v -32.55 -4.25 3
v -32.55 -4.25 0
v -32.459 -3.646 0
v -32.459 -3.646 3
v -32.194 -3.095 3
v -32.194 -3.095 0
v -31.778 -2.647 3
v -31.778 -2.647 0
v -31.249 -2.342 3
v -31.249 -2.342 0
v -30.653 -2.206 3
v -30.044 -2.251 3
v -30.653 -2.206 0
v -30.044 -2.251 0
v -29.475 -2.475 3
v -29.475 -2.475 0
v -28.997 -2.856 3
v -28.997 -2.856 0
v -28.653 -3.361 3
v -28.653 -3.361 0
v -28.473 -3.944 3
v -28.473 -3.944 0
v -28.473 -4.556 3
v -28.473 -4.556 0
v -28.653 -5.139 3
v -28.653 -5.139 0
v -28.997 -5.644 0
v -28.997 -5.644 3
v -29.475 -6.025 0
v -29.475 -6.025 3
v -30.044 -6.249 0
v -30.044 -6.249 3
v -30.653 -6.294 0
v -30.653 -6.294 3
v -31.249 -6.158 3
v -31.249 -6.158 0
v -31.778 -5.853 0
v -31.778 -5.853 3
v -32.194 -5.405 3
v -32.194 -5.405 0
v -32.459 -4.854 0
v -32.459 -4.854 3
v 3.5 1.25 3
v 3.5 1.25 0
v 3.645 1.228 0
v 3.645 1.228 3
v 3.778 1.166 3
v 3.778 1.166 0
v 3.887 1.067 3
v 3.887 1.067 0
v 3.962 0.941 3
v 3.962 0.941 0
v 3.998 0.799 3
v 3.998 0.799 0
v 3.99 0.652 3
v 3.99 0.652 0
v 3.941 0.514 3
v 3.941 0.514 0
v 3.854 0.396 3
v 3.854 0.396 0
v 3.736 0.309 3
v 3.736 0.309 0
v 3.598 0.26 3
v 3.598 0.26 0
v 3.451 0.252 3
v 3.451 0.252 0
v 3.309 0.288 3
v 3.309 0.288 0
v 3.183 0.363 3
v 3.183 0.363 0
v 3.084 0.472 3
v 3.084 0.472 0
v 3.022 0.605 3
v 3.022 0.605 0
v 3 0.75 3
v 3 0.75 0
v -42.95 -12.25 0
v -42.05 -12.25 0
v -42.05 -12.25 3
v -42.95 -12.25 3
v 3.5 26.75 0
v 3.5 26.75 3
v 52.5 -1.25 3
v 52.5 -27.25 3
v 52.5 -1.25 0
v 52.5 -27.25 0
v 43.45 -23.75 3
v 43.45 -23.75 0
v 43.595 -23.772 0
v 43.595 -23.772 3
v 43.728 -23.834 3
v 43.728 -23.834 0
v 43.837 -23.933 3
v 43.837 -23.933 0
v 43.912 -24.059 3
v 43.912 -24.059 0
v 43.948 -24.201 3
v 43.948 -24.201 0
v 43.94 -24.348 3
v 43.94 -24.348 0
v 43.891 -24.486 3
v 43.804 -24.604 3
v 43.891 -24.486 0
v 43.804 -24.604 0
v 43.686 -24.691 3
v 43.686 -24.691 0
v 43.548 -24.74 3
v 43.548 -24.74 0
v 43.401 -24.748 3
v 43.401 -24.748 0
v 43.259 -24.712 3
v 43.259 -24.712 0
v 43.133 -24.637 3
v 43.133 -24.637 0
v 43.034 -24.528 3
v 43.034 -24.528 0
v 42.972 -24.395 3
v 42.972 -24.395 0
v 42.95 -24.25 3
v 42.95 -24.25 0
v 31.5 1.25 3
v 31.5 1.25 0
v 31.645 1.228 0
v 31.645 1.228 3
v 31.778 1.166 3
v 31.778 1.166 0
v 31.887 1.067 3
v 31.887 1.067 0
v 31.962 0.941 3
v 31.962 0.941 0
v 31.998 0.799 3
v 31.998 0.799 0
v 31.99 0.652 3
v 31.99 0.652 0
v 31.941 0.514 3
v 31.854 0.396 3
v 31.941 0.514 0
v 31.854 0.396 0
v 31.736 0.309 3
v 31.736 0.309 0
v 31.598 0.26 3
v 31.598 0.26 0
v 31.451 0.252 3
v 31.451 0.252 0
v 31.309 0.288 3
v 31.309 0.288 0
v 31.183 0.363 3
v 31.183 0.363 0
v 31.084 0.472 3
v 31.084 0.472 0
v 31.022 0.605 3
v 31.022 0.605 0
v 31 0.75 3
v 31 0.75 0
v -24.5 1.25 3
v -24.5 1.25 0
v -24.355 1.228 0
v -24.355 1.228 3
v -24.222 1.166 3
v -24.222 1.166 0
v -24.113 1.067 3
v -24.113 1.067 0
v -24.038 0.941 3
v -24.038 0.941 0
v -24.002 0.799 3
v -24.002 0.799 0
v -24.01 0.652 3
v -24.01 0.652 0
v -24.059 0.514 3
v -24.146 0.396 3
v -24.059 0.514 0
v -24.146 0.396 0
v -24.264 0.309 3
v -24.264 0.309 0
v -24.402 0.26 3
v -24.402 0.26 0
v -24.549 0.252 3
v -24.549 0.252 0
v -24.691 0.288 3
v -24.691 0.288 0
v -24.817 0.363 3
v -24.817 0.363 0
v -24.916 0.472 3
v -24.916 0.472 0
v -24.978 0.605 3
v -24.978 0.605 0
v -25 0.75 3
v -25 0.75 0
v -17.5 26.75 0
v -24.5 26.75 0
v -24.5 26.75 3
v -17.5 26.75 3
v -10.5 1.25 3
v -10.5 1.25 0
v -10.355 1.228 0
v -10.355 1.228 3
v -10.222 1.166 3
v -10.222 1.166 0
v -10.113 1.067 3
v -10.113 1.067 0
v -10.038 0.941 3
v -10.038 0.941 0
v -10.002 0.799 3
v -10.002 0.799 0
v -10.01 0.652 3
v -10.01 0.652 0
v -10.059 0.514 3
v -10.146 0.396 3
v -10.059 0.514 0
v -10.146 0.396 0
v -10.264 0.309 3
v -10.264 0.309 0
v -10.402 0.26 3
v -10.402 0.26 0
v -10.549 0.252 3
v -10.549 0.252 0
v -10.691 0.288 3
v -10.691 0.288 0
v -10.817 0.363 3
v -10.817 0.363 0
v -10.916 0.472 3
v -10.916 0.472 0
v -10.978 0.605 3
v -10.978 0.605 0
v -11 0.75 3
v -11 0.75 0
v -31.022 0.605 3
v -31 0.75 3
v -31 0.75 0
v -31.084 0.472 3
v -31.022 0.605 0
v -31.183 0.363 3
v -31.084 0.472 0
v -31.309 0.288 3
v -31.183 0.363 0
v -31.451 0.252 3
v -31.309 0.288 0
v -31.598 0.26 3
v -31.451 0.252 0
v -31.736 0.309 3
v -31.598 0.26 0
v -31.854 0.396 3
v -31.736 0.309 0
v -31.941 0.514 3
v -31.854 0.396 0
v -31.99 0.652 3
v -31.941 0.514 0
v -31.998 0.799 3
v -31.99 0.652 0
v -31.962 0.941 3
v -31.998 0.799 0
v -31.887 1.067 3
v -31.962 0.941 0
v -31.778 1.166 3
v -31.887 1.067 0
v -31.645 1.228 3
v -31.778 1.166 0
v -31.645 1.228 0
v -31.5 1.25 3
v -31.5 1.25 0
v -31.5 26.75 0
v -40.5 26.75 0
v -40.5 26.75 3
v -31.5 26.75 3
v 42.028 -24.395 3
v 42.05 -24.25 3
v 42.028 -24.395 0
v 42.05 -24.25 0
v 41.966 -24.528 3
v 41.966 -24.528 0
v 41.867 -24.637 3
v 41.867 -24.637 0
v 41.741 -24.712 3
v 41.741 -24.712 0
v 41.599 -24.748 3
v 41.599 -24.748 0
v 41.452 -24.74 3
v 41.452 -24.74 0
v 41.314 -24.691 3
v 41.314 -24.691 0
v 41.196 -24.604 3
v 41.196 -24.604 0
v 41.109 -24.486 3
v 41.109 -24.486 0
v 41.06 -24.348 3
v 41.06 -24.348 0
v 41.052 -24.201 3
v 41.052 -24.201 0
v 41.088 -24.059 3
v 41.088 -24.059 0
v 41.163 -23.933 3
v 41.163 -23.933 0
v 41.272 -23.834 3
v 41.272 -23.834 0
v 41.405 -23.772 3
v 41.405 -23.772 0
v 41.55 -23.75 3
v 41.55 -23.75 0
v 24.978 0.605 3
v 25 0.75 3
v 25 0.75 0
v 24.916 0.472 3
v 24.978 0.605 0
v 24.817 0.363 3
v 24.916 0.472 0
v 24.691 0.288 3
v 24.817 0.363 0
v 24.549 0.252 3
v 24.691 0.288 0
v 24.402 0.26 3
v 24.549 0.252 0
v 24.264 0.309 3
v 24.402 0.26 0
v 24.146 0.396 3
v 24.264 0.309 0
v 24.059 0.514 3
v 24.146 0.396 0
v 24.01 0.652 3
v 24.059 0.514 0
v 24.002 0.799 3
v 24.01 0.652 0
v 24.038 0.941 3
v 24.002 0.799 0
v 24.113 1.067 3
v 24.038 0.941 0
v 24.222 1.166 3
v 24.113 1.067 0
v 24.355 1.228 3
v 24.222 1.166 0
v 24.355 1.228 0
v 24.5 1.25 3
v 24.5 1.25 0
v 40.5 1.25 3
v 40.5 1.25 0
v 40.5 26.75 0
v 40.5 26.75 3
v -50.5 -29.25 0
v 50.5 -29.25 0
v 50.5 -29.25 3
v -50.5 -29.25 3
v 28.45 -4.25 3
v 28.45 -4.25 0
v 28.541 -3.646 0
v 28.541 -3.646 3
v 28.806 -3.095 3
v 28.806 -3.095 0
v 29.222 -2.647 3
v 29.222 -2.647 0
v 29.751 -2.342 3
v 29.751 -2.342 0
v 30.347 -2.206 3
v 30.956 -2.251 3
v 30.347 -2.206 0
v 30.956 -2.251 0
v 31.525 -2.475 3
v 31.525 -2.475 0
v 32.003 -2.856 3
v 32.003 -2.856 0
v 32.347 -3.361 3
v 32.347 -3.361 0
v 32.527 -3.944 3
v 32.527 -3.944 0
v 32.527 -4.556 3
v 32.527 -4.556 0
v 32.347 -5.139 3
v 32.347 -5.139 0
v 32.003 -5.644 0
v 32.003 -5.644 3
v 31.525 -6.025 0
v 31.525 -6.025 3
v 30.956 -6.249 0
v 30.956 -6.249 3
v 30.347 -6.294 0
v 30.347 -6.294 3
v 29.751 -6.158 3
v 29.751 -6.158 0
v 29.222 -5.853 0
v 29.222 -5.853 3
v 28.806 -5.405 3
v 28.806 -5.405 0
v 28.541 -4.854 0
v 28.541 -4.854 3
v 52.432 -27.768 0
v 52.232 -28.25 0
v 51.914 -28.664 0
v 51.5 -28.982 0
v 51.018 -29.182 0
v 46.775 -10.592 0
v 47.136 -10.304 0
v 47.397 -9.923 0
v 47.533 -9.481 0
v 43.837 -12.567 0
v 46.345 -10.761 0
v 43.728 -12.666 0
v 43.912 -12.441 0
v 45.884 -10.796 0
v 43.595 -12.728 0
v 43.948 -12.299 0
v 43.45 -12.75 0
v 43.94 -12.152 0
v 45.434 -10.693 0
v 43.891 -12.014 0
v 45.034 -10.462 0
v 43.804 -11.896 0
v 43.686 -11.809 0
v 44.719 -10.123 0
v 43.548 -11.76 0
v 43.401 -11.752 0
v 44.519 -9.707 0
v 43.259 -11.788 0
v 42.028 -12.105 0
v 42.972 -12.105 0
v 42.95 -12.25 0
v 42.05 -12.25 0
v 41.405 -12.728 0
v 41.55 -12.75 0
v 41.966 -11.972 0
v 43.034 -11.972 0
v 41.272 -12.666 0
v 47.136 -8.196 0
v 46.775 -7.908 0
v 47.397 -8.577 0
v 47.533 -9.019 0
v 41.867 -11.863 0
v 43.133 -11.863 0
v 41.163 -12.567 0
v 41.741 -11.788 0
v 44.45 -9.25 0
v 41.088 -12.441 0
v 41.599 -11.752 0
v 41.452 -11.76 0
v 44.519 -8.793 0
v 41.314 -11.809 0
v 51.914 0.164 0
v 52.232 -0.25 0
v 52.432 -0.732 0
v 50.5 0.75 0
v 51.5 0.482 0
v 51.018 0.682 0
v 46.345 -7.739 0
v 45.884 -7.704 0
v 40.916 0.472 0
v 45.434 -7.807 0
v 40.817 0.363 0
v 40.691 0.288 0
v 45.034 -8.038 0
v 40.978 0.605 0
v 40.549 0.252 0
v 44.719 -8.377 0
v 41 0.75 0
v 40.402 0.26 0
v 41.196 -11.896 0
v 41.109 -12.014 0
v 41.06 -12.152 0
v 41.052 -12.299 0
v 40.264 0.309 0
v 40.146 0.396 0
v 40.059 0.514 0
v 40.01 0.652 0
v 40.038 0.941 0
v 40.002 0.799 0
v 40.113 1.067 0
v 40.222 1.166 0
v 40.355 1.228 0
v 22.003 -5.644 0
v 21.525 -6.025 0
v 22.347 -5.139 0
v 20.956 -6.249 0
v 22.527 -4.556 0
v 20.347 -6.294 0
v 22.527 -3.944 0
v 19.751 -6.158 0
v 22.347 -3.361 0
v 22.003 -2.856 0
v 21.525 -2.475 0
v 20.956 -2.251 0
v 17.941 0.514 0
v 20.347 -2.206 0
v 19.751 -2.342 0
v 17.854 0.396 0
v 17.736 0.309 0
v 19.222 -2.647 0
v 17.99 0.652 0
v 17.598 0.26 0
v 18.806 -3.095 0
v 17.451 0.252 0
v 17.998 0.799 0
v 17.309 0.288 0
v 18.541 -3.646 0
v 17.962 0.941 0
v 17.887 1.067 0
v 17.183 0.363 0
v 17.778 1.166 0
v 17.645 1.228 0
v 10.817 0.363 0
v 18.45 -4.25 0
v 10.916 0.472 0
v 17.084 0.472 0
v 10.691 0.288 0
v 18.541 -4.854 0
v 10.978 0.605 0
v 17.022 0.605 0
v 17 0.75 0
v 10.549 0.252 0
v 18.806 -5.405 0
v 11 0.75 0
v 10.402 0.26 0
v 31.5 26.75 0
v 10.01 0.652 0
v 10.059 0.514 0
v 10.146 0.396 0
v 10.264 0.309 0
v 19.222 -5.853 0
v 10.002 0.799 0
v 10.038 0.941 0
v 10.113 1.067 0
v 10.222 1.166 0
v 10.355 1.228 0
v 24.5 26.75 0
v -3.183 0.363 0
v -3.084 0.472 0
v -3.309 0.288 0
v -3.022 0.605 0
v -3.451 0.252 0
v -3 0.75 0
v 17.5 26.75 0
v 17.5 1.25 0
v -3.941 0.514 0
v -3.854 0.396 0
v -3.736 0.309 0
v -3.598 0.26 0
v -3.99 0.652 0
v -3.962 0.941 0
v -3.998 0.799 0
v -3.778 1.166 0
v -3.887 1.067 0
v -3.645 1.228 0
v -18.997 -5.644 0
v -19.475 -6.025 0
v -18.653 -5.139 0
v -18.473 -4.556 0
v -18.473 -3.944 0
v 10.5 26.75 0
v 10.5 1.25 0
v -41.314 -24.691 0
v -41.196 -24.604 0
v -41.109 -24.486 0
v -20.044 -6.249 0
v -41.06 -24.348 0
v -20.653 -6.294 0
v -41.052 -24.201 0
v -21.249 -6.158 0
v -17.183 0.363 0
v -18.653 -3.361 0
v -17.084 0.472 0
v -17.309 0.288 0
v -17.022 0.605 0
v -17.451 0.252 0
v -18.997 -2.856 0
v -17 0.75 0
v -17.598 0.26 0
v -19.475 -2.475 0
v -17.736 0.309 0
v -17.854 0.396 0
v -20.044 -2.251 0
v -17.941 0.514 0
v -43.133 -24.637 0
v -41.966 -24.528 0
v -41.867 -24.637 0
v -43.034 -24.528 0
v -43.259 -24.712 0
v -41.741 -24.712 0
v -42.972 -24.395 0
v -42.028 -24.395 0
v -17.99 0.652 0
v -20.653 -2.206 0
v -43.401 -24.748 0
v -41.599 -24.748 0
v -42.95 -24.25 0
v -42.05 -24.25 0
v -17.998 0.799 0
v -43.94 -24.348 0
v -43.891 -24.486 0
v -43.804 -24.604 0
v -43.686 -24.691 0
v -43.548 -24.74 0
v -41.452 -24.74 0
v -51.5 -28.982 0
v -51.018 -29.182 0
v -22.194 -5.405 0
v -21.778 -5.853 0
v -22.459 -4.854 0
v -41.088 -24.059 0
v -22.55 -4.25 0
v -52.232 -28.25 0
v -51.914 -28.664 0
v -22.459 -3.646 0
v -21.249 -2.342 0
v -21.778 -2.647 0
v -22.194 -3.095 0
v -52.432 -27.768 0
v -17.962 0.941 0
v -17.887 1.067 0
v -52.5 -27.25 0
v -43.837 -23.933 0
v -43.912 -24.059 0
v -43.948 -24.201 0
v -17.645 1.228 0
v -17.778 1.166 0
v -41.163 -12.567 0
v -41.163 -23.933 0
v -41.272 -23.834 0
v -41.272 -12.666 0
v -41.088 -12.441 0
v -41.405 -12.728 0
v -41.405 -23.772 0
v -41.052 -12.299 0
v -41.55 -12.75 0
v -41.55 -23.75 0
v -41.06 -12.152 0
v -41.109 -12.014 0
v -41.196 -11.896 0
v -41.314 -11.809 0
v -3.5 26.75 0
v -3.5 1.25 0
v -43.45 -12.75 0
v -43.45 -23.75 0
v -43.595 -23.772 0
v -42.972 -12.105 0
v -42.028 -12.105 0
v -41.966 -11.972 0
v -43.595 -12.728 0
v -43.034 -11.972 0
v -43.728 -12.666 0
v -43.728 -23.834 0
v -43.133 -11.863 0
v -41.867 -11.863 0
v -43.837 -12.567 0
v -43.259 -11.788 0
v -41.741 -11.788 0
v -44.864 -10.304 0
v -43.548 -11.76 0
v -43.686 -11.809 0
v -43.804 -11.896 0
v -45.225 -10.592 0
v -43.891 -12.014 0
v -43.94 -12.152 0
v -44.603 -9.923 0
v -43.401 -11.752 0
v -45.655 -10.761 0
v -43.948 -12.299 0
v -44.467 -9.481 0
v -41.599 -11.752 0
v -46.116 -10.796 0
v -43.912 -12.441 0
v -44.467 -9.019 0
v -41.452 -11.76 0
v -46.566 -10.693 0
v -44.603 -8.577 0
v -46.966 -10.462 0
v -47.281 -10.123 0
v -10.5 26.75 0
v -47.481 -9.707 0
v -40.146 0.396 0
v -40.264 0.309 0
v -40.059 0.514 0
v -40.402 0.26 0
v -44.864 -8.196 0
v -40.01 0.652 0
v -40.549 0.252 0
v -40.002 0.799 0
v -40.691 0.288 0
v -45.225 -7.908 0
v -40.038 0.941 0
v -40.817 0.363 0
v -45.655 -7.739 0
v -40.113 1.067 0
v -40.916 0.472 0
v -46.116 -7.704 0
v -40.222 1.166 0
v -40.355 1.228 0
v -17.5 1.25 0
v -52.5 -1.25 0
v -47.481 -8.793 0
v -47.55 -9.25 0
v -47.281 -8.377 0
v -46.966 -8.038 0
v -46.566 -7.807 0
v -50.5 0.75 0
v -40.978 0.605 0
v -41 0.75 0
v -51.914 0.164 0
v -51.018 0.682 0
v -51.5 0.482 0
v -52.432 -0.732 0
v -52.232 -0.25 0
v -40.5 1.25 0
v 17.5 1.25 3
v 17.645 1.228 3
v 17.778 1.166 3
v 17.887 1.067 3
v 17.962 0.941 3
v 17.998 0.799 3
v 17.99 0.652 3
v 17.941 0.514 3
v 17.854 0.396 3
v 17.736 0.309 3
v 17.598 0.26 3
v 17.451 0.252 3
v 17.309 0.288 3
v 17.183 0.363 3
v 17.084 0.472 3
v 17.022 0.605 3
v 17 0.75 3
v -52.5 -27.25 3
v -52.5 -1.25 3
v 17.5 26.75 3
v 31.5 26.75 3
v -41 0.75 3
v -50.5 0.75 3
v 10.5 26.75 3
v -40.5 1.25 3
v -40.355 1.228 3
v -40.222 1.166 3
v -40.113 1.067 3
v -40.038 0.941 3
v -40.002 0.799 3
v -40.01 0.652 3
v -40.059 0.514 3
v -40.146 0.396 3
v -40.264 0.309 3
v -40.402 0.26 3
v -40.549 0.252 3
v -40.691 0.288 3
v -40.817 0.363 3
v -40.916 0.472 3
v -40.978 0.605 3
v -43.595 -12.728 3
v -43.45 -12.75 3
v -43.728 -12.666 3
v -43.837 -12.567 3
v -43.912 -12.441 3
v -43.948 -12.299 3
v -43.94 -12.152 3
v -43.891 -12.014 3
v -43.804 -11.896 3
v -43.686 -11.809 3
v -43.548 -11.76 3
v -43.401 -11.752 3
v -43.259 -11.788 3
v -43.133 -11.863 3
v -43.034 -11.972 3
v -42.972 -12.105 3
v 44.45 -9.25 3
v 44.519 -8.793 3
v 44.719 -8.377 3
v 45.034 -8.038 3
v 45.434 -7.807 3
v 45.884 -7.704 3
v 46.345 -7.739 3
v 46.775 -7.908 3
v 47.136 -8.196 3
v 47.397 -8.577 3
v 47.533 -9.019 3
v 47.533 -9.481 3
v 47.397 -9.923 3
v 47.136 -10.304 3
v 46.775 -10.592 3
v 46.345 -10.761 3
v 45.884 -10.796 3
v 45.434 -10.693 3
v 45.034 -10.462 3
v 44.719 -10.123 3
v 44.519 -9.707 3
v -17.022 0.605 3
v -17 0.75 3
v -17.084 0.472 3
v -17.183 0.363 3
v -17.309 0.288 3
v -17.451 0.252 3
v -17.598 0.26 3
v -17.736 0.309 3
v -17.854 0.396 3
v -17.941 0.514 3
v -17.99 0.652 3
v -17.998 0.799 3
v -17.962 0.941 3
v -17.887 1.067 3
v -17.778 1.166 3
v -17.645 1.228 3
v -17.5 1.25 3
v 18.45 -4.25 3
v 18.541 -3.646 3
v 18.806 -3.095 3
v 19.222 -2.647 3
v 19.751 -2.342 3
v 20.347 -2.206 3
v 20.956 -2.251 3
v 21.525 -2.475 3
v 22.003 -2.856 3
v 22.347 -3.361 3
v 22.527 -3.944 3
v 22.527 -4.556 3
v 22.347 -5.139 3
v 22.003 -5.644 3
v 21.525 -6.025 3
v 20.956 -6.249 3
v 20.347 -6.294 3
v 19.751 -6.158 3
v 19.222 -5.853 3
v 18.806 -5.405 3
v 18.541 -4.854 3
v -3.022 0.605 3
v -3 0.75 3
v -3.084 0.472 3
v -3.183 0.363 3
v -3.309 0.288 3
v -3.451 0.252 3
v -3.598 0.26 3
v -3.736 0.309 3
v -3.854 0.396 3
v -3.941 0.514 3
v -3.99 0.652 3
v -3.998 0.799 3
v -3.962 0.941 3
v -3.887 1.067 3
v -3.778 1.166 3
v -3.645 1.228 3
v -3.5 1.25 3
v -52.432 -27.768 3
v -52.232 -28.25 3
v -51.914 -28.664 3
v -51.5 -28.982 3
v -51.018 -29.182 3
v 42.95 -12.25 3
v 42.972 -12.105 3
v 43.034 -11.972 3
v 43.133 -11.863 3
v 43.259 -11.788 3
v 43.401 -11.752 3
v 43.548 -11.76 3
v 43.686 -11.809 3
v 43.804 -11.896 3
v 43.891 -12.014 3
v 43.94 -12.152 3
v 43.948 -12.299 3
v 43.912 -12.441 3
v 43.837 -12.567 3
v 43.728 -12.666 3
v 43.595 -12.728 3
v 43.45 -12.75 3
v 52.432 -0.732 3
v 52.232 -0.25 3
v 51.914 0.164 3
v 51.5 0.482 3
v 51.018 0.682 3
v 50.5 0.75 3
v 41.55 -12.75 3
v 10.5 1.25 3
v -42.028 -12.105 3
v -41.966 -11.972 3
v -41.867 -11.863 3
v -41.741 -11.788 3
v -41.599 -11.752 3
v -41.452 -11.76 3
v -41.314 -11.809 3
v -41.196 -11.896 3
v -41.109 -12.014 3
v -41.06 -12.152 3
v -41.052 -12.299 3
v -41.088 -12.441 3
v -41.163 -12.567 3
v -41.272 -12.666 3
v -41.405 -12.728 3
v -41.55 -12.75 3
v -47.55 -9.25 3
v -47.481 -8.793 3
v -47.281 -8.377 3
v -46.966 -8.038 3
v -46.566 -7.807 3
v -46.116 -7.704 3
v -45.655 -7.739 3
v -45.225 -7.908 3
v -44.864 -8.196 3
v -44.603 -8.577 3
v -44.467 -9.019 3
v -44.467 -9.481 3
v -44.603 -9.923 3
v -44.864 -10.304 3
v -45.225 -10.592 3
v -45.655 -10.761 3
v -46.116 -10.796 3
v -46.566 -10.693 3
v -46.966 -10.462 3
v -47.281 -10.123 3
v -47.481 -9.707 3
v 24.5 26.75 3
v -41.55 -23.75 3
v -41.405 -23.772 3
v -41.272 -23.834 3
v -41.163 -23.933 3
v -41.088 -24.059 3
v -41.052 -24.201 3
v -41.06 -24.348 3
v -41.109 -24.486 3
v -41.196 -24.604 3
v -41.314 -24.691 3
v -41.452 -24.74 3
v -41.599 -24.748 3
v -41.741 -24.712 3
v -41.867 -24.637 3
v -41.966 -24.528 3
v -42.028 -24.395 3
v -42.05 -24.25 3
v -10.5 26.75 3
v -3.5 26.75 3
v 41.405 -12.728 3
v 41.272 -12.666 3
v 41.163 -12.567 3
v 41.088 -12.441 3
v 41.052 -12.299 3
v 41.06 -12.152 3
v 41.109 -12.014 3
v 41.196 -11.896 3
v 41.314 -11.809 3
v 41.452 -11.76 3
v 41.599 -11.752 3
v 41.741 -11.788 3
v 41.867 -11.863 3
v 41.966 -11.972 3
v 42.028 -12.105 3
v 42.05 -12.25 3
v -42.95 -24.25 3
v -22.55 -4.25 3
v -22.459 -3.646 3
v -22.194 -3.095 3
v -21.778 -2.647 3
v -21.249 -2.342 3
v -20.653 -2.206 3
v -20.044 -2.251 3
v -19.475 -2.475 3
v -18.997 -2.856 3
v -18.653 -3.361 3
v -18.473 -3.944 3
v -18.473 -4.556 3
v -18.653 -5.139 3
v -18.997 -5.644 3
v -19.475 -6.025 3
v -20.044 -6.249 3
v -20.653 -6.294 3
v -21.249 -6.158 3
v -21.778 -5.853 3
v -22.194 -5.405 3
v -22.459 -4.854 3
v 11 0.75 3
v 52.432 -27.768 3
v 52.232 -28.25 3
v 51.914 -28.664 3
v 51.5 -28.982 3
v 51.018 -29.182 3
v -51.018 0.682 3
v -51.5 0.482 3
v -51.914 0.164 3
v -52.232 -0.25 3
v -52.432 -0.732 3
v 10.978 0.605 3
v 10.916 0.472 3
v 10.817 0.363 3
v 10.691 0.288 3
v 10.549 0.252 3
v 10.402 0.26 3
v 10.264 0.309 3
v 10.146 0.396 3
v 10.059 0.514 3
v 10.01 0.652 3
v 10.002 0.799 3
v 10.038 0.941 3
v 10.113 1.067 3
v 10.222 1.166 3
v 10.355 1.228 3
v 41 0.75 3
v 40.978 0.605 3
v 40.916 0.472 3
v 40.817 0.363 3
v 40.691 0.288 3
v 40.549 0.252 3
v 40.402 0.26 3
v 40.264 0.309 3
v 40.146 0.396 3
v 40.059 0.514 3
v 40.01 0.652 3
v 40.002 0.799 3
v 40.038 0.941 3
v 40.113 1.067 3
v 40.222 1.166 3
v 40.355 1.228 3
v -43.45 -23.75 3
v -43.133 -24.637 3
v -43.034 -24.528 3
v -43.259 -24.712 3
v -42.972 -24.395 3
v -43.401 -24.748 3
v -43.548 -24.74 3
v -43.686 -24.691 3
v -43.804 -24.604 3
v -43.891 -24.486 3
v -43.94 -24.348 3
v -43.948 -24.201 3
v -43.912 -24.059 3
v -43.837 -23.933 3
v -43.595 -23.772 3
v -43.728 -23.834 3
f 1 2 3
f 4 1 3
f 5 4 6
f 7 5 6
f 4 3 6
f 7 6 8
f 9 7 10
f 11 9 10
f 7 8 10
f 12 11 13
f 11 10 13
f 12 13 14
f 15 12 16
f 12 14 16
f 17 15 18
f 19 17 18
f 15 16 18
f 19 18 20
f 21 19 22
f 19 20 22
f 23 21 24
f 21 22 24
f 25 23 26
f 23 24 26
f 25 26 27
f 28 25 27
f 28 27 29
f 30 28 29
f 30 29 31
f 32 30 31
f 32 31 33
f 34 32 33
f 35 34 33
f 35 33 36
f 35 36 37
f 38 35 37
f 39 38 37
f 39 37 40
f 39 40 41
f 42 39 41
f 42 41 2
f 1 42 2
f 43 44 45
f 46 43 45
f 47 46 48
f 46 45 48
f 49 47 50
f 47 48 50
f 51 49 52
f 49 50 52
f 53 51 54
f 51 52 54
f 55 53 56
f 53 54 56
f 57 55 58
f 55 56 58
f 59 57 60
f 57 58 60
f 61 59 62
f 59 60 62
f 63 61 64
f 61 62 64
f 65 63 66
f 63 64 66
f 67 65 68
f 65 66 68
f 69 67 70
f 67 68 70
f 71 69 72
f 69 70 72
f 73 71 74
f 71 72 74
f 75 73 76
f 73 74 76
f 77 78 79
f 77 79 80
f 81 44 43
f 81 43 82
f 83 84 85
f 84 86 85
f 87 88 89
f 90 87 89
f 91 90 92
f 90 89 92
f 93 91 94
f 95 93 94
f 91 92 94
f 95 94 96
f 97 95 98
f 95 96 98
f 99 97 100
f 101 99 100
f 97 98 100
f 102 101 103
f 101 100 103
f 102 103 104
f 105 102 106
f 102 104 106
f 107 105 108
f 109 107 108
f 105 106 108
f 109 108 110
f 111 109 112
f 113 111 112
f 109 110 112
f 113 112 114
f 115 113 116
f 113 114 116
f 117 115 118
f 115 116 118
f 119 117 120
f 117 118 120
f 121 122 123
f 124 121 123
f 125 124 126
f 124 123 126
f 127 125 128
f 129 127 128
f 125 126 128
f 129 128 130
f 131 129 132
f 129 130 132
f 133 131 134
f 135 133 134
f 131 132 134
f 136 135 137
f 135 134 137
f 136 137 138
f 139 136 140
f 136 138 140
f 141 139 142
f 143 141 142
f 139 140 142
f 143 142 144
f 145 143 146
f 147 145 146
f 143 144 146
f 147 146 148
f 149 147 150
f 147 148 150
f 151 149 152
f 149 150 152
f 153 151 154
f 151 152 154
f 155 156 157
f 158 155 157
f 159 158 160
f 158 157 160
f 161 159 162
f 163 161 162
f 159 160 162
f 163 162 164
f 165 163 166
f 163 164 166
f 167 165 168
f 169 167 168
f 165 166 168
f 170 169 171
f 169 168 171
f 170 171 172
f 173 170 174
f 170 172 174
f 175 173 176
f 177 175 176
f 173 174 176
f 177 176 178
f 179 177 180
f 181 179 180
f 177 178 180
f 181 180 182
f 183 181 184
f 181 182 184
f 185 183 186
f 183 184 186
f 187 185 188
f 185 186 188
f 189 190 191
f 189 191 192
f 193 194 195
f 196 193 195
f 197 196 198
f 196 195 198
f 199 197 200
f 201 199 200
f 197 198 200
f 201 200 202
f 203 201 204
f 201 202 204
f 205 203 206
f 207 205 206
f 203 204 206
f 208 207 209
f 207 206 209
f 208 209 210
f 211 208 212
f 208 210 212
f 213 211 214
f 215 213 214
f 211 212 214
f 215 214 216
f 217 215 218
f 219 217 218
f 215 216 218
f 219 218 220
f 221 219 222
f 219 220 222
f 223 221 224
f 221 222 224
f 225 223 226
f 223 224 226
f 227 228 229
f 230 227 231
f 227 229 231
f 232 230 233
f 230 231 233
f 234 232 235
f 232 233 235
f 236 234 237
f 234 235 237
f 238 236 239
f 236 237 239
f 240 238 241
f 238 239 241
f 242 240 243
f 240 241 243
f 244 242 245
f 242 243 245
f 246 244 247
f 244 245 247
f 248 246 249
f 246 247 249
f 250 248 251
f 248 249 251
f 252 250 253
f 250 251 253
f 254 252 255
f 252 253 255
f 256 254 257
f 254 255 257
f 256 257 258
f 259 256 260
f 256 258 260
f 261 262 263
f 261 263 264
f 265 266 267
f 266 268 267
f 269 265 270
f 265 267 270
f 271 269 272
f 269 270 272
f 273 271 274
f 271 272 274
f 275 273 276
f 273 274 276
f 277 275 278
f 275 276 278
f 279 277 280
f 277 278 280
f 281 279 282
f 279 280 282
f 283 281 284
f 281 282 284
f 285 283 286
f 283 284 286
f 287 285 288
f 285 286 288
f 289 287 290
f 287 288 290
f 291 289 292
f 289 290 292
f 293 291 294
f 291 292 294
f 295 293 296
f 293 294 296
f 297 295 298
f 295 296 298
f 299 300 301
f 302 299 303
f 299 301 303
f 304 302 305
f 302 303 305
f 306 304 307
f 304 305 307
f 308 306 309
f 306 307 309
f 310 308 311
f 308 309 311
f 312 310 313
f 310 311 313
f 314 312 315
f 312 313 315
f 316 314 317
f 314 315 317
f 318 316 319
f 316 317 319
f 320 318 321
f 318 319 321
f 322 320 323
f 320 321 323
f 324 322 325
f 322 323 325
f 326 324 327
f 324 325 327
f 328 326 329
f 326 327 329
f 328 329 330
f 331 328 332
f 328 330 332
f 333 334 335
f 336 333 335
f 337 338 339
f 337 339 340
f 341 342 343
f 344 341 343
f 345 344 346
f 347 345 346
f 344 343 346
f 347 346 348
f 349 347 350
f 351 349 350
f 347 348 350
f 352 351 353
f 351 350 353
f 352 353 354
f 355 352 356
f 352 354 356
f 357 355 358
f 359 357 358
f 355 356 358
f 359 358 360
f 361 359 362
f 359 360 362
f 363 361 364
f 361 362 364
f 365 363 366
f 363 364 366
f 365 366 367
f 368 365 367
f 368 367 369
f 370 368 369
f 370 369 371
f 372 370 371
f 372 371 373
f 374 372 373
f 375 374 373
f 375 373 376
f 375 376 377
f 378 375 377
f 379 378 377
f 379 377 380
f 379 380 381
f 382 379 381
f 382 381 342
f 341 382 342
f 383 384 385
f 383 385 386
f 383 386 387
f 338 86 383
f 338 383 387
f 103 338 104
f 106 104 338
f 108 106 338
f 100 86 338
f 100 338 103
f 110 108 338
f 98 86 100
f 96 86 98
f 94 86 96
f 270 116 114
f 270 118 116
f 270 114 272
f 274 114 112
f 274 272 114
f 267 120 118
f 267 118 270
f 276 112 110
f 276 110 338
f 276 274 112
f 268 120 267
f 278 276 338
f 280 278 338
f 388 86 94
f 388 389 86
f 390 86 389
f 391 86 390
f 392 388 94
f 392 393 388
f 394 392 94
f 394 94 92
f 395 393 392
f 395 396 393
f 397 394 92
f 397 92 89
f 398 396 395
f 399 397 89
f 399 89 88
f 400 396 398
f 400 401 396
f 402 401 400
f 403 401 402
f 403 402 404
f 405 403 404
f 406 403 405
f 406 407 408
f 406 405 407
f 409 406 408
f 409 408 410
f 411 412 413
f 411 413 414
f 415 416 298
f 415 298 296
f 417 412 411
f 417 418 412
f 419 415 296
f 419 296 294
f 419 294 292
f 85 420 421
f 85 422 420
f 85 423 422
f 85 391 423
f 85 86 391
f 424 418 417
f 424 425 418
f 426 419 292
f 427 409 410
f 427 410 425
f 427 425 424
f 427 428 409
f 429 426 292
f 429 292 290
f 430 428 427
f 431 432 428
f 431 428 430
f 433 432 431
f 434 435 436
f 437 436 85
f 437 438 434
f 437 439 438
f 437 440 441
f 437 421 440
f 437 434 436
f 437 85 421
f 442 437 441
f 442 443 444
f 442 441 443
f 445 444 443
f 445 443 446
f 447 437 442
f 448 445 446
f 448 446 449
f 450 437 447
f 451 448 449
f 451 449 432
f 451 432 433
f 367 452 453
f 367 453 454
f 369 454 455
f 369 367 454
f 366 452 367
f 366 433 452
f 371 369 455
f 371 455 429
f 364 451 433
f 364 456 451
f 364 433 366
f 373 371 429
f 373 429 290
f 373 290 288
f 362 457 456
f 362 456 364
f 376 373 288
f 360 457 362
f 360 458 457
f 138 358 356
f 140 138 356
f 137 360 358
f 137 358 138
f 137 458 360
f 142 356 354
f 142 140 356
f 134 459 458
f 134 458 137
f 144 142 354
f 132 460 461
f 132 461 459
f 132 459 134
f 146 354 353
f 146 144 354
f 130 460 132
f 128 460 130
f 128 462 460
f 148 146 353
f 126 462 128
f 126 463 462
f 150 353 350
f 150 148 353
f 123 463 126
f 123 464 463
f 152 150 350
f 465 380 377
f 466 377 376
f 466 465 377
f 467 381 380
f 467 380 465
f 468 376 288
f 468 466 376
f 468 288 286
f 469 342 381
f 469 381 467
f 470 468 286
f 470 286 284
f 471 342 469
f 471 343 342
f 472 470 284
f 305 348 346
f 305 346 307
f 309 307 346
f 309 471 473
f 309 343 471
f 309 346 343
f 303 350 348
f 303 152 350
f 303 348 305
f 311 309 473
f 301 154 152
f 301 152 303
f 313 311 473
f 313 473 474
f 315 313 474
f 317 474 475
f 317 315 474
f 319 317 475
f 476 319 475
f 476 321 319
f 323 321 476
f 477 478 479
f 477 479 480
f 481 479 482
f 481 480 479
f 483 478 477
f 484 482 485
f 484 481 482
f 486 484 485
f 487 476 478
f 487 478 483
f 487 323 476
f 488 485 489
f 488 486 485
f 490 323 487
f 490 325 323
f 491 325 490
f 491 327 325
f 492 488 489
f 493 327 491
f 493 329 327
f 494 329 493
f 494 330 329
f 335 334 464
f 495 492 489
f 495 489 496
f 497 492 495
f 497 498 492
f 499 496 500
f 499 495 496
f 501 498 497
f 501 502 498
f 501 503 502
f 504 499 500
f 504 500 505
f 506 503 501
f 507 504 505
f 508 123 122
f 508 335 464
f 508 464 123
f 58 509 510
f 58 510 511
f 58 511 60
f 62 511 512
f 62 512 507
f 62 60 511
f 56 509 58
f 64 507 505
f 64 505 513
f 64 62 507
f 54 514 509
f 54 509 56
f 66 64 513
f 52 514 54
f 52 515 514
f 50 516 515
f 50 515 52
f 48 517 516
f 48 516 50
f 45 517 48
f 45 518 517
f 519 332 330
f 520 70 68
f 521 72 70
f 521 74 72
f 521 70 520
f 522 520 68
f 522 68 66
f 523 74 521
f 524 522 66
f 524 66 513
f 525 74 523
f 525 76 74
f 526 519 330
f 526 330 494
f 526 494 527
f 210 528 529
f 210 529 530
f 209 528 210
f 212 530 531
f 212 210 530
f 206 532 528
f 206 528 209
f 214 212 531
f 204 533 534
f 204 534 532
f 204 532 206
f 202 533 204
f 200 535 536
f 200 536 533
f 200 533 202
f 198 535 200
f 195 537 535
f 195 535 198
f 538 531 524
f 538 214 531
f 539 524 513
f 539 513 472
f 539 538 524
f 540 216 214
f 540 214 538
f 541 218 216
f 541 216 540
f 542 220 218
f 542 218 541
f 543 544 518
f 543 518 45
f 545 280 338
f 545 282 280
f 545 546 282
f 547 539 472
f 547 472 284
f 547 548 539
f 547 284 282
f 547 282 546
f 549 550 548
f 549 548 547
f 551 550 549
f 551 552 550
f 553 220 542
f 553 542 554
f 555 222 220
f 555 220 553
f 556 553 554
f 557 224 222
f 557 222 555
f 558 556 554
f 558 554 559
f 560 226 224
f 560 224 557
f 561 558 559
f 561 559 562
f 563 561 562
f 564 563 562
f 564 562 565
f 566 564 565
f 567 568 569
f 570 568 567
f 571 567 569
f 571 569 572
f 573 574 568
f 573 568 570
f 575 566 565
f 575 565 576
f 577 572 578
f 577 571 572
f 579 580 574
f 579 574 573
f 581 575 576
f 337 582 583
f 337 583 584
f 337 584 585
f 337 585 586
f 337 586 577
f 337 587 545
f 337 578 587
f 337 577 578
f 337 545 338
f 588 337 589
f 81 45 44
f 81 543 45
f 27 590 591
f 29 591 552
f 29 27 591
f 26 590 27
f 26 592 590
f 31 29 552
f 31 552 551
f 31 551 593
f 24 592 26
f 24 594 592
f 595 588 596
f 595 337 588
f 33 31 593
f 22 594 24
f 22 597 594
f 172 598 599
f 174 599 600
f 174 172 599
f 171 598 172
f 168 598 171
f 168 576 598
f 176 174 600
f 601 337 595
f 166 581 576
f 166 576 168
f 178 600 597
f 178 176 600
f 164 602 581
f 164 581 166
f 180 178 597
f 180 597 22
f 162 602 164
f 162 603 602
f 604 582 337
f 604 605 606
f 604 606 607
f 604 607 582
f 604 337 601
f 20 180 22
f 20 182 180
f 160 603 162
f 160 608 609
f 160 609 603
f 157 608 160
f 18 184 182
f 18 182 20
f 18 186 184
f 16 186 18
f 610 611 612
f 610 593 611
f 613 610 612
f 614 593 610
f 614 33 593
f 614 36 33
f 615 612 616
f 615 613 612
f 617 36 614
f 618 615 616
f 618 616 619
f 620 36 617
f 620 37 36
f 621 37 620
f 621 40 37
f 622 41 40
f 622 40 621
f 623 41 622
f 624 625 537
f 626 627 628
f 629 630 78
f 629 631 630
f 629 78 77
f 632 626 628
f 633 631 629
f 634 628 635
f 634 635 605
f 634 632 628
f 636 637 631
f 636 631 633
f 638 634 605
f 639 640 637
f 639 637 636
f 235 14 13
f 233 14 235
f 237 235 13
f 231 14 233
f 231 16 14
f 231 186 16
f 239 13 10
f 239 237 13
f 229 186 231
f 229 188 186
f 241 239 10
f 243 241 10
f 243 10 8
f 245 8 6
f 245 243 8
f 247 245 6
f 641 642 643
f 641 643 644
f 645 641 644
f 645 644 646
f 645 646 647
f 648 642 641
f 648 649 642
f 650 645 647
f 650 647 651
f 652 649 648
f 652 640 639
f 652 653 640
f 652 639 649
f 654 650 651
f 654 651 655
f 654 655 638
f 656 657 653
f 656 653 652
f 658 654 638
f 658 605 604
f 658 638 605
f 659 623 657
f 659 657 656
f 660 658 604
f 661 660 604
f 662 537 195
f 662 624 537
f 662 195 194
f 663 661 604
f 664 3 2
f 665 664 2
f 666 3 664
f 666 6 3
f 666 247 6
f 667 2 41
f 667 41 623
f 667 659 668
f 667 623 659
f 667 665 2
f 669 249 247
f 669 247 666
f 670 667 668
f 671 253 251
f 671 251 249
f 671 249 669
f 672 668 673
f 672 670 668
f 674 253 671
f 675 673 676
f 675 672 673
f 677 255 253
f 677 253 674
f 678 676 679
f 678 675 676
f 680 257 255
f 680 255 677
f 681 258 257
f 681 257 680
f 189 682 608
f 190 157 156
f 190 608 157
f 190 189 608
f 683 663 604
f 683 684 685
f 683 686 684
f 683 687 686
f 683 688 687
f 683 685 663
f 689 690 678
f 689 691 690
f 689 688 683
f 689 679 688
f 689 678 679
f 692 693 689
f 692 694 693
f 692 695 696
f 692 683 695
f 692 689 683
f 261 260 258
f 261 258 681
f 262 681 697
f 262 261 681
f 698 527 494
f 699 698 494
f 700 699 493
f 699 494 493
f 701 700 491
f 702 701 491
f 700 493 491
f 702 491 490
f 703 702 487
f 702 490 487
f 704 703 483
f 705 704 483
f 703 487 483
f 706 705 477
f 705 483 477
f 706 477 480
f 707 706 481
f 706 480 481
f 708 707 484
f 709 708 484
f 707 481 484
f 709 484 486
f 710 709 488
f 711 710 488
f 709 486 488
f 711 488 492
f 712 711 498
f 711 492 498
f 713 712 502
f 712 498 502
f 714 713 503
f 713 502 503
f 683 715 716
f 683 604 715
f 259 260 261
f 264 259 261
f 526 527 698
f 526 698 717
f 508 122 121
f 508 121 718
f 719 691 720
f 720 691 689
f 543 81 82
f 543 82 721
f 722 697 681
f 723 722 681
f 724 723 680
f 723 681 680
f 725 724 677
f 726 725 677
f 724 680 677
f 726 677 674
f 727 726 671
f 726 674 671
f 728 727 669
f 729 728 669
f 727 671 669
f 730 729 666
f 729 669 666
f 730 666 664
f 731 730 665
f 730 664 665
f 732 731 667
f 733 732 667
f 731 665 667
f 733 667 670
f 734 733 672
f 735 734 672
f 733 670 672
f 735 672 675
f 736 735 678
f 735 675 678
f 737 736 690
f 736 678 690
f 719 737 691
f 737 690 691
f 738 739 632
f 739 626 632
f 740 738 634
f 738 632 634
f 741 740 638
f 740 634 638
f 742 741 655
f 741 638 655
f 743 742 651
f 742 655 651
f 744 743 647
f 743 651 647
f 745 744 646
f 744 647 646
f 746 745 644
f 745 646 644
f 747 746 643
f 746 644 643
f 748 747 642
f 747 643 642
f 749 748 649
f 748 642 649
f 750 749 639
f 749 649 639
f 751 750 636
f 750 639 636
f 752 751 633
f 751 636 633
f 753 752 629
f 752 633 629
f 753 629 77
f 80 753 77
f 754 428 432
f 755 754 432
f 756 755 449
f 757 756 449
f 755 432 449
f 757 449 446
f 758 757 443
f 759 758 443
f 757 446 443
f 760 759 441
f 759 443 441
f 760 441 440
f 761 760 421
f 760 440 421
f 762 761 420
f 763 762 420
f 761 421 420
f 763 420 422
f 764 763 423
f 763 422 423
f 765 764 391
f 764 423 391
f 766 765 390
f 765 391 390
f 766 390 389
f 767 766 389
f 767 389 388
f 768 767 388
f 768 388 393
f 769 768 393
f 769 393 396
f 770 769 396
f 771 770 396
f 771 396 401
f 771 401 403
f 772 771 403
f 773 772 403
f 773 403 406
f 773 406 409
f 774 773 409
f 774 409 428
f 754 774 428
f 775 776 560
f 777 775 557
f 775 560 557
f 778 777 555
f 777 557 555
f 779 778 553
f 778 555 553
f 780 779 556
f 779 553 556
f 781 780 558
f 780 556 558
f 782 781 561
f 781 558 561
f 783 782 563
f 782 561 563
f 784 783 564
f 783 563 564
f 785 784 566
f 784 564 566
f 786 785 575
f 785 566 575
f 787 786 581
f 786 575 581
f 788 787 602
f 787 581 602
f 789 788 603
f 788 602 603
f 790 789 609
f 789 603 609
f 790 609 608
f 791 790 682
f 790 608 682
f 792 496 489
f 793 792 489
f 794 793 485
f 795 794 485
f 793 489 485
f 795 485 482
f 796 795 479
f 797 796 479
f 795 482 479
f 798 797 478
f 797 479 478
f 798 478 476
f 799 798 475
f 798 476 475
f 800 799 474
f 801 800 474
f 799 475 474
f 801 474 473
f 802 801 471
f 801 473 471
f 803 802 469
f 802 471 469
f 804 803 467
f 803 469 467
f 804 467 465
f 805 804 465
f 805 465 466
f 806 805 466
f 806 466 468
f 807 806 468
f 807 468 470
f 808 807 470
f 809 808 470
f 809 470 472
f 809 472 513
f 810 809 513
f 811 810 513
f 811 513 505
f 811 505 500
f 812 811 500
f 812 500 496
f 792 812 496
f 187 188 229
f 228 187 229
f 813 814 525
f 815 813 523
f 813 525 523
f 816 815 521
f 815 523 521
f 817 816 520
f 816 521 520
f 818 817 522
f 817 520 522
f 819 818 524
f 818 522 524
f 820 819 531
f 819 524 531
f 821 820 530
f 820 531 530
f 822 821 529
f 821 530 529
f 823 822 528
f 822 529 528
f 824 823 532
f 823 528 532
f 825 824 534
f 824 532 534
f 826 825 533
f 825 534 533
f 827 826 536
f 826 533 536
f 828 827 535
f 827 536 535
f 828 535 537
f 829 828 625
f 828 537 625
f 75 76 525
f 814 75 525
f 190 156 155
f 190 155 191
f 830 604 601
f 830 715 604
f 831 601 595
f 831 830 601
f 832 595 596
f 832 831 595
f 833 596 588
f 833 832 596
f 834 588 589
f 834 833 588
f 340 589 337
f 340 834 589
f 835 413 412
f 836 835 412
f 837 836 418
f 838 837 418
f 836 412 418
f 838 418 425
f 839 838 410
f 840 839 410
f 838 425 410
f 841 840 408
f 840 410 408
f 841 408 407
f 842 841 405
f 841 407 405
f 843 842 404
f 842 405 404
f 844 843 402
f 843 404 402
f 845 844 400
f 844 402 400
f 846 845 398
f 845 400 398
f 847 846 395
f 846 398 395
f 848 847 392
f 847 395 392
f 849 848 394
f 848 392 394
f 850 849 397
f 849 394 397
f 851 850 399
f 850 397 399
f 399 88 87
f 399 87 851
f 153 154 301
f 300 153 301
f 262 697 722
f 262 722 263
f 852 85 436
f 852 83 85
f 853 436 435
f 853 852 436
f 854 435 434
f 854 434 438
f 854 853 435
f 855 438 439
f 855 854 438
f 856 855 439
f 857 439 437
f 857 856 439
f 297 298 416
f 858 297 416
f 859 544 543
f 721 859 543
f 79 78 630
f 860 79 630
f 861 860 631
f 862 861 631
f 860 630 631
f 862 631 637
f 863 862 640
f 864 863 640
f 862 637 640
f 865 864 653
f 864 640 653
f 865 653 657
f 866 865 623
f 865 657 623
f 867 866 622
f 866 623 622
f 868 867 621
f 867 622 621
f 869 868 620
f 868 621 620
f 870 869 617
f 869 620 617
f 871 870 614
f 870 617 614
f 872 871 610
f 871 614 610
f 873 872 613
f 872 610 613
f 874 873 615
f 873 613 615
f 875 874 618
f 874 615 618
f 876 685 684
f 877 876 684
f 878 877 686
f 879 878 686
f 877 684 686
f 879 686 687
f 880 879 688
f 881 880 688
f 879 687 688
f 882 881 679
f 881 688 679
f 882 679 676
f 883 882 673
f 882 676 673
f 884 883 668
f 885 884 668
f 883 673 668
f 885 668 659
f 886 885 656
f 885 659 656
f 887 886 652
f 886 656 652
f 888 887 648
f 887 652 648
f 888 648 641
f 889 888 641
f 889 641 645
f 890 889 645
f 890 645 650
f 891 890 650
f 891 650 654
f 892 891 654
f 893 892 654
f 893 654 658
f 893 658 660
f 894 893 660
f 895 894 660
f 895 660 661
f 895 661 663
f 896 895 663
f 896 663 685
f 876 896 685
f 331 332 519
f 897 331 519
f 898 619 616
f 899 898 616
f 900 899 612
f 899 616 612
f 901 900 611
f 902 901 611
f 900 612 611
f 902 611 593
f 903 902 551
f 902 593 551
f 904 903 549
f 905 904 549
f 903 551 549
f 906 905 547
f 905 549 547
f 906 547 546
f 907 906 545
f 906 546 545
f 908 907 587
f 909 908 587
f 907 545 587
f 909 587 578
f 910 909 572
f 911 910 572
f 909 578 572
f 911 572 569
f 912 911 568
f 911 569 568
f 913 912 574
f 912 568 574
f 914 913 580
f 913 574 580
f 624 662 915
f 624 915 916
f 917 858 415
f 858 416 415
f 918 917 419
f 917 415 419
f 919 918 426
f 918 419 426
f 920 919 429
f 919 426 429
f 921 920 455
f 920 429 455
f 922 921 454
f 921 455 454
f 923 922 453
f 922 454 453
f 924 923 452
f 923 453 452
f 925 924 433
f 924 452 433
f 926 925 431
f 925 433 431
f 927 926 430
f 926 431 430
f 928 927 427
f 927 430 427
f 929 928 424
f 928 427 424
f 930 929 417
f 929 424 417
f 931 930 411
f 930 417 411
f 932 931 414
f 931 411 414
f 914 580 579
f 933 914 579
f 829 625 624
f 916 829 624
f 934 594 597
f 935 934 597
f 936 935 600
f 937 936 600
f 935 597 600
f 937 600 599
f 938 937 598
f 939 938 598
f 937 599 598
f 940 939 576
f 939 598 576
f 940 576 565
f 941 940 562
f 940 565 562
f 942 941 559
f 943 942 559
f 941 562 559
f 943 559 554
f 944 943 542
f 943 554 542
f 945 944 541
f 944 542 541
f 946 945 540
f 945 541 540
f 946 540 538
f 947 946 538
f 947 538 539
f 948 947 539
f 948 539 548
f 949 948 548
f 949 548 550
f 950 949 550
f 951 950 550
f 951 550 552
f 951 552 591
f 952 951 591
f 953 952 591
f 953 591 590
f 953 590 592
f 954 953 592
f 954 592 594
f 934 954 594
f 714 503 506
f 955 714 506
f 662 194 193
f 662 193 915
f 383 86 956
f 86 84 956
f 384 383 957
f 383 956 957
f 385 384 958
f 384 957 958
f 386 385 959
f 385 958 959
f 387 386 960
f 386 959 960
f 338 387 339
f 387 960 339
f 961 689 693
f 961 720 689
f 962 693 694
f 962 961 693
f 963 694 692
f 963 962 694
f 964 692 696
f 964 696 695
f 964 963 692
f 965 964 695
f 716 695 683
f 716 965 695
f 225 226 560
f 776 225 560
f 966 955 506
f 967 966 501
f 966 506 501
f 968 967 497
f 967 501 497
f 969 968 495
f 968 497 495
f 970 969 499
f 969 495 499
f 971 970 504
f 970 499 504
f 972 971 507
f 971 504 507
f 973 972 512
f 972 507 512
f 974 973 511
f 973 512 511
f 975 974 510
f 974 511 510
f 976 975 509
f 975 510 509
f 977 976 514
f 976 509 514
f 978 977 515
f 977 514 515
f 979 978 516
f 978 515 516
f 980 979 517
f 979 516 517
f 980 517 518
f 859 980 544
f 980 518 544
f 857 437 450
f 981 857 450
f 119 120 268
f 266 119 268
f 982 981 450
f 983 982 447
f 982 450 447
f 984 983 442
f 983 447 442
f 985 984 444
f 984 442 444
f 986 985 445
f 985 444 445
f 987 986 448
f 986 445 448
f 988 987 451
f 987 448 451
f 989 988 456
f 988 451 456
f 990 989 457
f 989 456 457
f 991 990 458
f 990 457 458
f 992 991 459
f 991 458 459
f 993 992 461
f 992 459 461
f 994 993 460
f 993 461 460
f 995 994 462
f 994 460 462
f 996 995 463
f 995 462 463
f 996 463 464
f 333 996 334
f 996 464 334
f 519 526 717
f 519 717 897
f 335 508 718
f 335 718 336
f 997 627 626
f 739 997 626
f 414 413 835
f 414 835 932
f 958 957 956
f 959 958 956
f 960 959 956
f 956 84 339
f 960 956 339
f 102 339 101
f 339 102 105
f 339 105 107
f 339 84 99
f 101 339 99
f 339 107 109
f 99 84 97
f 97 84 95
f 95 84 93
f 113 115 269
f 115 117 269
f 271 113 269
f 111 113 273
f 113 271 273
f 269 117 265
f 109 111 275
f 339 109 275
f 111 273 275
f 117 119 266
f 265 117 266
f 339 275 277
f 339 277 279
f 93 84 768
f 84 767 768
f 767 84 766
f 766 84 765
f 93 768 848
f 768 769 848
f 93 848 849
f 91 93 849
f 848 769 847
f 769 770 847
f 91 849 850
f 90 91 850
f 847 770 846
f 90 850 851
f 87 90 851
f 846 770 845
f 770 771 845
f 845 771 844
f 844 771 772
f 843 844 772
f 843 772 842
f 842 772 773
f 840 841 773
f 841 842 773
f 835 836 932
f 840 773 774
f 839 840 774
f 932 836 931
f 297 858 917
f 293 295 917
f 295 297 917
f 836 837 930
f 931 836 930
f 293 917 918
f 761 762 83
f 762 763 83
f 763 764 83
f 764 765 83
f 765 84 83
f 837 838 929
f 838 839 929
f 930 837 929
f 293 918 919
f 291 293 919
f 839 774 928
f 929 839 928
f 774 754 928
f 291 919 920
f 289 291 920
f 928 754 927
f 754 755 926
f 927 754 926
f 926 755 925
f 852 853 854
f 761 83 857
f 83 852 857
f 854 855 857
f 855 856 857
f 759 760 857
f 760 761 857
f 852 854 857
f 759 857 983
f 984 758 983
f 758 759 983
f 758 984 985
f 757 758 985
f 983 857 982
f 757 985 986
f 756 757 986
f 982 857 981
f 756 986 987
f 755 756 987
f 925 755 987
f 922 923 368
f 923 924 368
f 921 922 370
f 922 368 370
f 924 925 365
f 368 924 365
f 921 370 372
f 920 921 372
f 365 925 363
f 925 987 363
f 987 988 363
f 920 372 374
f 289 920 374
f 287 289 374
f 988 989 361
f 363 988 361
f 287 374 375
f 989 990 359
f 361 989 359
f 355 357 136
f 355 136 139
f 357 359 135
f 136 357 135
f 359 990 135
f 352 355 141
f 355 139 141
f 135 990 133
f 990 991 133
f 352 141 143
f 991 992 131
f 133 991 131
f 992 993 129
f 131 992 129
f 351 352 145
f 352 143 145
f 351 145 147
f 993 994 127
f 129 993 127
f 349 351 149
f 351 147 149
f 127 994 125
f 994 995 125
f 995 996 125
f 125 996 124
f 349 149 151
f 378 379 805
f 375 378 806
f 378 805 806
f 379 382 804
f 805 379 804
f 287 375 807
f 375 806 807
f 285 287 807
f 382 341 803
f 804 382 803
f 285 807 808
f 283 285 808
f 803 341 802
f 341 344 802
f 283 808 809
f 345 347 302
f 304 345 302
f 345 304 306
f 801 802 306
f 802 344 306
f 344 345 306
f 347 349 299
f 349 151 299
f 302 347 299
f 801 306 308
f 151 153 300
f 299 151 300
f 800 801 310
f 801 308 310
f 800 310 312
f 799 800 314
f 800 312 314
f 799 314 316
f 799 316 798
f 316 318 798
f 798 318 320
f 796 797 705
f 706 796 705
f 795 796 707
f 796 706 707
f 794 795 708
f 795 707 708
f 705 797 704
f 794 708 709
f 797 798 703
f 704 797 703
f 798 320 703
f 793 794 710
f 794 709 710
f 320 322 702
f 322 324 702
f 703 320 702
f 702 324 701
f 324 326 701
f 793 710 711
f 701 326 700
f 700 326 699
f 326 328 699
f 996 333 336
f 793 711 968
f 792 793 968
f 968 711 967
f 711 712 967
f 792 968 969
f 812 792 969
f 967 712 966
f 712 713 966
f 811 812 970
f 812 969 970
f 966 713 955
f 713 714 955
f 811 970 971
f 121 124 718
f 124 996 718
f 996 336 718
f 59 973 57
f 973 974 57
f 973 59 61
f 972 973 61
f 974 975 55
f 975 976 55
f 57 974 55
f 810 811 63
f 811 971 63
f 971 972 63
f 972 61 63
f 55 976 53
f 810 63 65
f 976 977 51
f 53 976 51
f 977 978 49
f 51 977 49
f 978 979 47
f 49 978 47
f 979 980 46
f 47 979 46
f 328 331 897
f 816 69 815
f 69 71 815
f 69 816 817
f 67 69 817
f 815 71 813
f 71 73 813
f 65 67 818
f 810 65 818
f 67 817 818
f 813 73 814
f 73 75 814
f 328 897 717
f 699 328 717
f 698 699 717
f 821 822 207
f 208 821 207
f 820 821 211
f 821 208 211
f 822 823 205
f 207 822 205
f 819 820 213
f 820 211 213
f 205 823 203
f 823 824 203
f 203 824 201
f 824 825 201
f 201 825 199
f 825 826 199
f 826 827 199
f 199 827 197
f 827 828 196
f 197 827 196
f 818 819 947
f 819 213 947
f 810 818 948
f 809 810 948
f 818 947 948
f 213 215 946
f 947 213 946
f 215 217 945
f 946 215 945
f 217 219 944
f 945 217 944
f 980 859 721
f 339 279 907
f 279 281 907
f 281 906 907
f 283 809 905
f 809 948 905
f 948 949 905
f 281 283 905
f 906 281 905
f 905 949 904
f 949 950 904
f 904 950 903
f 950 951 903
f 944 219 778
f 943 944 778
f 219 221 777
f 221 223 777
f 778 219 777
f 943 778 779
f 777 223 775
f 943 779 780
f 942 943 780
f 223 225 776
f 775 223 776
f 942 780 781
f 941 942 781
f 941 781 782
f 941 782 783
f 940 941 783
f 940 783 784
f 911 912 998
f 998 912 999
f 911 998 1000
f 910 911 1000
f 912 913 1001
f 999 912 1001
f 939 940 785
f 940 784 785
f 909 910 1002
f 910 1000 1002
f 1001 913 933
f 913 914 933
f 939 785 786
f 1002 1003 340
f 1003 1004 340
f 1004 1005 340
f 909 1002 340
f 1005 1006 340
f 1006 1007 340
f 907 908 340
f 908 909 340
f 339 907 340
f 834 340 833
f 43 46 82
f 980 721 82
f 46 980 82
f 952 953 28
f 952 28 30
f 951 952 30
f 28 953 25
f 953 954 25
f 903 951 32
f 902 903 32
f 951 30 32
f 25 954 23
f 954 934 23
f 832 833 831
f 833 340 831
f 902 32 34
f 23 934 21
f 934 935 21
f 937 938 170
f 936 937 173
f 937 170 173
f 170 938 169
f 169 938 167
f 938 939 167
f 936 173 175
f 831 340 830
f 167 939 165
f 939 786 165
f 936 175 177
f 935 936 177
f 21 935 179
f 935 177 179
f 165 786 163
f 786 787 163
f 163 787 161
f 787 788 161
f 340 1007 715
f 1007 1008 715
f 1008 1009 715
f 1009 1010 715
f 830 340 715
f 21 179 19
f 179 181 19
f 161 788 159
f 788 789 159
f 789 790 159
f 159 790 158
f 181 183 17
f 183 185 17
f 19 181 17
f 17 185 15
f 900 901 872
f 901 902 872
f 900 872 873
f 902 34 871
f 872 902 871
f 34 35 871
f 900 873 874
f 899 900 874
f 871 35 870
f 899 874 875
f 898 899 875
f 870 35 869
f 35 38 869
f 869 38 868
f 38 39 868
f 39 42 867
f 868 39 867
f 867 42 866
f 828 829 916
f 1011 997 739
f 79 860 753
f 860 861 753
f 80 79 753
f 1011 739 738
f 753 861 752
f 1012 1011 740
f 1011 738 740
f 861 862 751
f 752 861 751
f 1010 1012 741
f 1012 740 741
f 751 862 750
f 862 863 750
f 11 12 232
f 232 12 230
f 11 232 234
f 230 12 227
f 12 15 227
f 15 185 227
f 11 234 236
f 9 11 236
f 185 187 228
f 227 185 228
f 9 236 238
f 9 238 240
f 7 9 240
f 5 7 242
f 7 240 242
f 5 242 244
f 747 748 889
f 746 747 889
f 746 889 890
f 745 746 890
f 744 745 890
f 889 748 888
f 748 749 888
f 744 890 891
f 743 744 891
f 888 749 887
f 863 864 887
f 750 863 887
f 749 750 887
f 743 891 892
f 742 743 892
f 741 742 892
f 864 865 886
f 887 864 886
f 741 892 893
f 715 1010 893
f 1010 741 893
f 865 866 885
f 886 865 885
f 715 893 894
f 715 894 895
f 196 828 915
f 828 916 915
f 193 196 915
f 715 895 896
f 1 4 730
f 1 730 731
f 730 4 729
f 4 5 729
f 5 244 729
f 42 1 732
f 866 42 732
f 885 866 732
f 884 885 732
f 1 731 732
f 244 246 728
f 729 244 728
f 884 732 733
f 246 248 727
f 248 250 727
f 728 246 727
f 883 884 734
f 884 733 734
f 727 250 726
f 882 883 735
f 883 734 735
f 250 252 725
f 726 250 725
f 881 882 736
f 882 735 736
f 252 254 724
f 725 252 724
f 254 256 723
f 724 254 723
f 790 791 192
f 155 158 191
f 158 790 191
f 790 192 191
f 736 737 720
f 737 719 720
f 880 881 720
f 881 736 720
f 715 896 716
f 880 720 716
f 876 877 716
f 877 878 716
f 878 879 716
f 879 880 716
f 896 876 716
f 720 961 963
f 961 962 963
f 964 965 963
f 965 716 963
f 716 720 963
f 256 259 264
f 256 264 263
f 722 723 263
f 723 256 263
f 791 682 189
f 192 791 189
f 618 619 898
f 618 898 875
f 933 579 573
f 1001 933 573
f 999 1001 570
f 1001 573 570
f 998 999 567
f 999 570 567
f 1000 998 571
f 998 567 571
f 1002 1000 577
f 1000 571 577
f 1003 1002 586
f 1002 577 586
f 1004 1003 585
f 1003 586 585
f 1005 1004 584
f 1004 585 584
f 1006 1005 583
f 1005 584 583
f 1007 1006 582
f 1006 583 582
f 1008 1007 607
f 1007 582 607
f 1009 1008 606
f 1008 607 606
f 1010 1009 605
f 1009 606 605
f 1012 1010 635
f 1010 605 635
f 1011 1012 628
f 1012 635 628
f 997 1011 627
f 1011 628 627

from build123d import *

# Parameters (mm, degrees)
SKETCH_1_W          = 105
SKETCH_1_H          = 53.5
EXTRUDE_1_DEPTH     = 3
SKETCH_2_R          = 1.55
SKETCH_2_W          = 2
SKETCH_2_H          = 12
CUT_EXTRUDE_1_DEPTH = 5
SKETCH_3_W          = 7
SKETCH_3_H          = 26
SKETCH_3_W_2        = 12
CUT_EXTRUDE_2_DEPTH = 4
SKETCH_8_W          = 105
SKETCH_8_H          = 2.5
EXTRUDE_2_DEPTH     = 3
FILLET_1_R          = 2
SKETCH_7_R          = 0.5
CUT_EXTRUDE_6_DEPTH = 10
SKETCH_10_W         = 0.05
SKETCH_10_H         = 12
EXTRUDE_3_DEPTH     = 3
SKETCH_11_R         = 0.5
CUT_EXTRUDE_7_DEPTH = 10
SKETCH_12_R         = 2.05
CUT_EXTRUDE_8_DEPTH = 10


with BuildPart() as part:
    # 草图1 → 凸台-拉伸1 (new body)
    with BuildSketch(Plane.XY):
        Rectangle(SKETCH_1_W, SKETCH_1_H)
    extrude(amount=EXTRUDE_1_DEPTH)

    # 草图2 → 切除-拉伸1 (cut)
    with BuildSketch(Plane(origin=(0, 0, 0), x_dir=(-1, 0, 0), z_dir=(0, 0, -1))):
        with Locations((46, -9.25)):
            Circle(SKETCH_2_R)
        with Locations((-46, -9.25)):
            Circle(SKETCH_2_R)
        with Locations((42.5, -18.25)):
            Rectangle(SKETCH_2_W, SKETCH_2_H)
        with Locations((-42.5, -18.25)):
            Rectangle(SKETCH_2_W, SKETCH_2_H)
    extrude(amount=-CUT_EXTRUDE_1_DEPTH, mode=Mode.SUBTRACT)

    # 草图3 → 切除-拉伸2 (cut, through all)
    with BuildSketch(Plane(origin=(0, 0, 0), x_dir=(-1, 0, 0), z_dir=(0, 0, -1))):
        with Locations((-28, 13.75)):
            Rectangle(SKETCH_3_W, SKETCH_3_H)
        with Locations((-14, 13.75)):
            Rectangle(SKETCH_3_W, SKETCH_3_H)
        with Locations((46.5, 13.75)):
            Rectangle(SKETCH_3_W_2, SKETCH_3_H)
        with Locations((28, 13.75)):
            Rectangle(SKETCH_3_W, SKETCH_3_H)
        with Locations((0, 13.75)):
            Rectangle(SKETCH_3_W, SKETCH_3_H)
        with Locations((-46.5, 13.75)):
            Rectangle(SKETCH_3_W_2, SKETCH_3_H)
        with Locations((14, 13.75)):
            Rectangle(SKETCH_3_W, SKETCH_3_H)
    extrude(amount=-CUT_EXTRUDE_2_DEPTH, mode=Mode.SUBTRACT)

    # 草图8 → 凸台-拉伸2 (add)
    with BuildSketch(Plane(origin=(0, 0, 0), x_dir=(-1, 0, 0), z_dir=(0, 0, -1))):
        with Locations((0, -28)):
            Rectangle(SKETCH_8_W, SKETCH_8_H)
    extrude(amount=-EXTRUDE_2_DEPTH)

    # 圆角1
    fillet_1_edges = [part.edges().sort_by_distance(p)[0] for p in [
        (-52.5, 0.75, 1.5),
        (52.5, 0.75, 1.5),
        (-52.5, -29.25, 1.5),
        (52.5, -29.25, 1.5),
    ]]
    fillet(fillet_1_edges, radius=FILLET_1_R)

    # 草图7 → 切除-拉伸6 (cut)
    with BuildSketch(Plane(origin=(0, 0, 0), x_dir=(-1, 0, 0), z_dir=(0, 0, -1))):
        with Locations((-40.5, 0.75)):
            Circle(SKETCH_7_R)
        with Locations((-31.5, 0.75)):
            Circle(SKETCH_7_R)
        with Locations((-24.5, 0.75)):
            Circle(SKETCH_7_R)
        with Locations((-17.5, 0.75)):
            Circle(SKETCH_7_R)
        with Locations((-10.5, 0.75)):
            Circle(SKETCH_7_R)
        with Locations((24.5, 0.75)):
            Circle(SKETCH_7_R)
        with Locations((31.5, 0.75)):
            Circle(SKETCH_7_R)
        with Locations((40.5, 0.75)):
            Circle(SKETCH_7_R)
        with Locations((-3.5, 0.75)):
            Circle(SKETCH_7_R)
        with Locations((3.5, 0.75)):
            Circle(SKETCH_7_R)
        with Locations((10.5, 0.75)):
            Circle(SKETCH_7_R)
        with Locations((17.5, 0.75)):
            Circle(SKETCH_7_R)
    extrude(amount=-CUT_EXTRUDE_6_DEPTH, mode=Mode.SUBTRACT)

    # 草图10 → 凸台-拉伸3 (add)
    with BuildSketch(Plane(origin=(0, 0, 0), x_dir=(-1, 0, 0), z_dir=(0, 0, -1))):
        with Locations((43.475, -18.25)):
            Rectangle(SKETCH_10_W, SKETCH_10_H)
        with Locations((41.525, -18.25)):
            Rectangle(SKETCH_10_W, SKETCH_10_H)
        with Locations((-41.525, -18.25)):
            Rectangle(SKETCH_10_W, SKETCH_10_H)
        with Locations((-43.475, -18.25)):
            Rectangle(SKETCH_10_W, SKETCH_10_H)
    extrude(amount=-EXTRUDE_3_DEPTH)

    # 草图11 → 切除-拉伸7 (cut)
    with BuildSketch(Plane(origin=(0, 0, 0), x_dir=(-1, 0, 0), z_dir=(0, 0, -1))):
        with Locations((43.45, -24.25)):
            Circle(SKETCH_11_R)
        with Locations((41.55, -24.25)):
            Circle(SKETCH_11_R)
        with Locations((43.45, -12.25)):
            Circle(SKETCH_11_R)
        with Locations((41.55, -12.25)):
            Circle(SKETCH_11_R)
        with Locations((-41.55, -24.25)):
            Circle(SKETCH_11_R)
        with Locations((-43.45, -24.25)):
            Circle(SKETCH_11_R)
        with Locations((-43.45, -12.25)):
            Circle(SKETCH_11_R)
        with Locations((-41.55, -12.25)):
            Circle(SKETCH_11_R)
    extrude(amount=-CUT_EXTRUDE_7_DEPTH, mode=Mode.SUBTRACT)

    # 草图12 → 切除-拉伸8 (cut)
    with BuildSketch(Plane(origin=(0, 0, 0), x_dir=(-1, 0, 0), z_dir=(0, 0, -1))):
        with Locations((-30.5, -4.25)):
            Circle(SKETCH_12_R)
        with Locations((-20.5, -4.25)):
            Circle(SKETCH_12_R)
        with Locations((20.5, -4.25)):
            Circle(SKETCH_12_R)
        with Locations((30.5, -4.25)):
            Circle(SKETCH_12_R)
    extrude(amount=-CUT_EXTRUDE_8_DEPTH, mode=Mode.SUBTRACT)


solid = part.part
